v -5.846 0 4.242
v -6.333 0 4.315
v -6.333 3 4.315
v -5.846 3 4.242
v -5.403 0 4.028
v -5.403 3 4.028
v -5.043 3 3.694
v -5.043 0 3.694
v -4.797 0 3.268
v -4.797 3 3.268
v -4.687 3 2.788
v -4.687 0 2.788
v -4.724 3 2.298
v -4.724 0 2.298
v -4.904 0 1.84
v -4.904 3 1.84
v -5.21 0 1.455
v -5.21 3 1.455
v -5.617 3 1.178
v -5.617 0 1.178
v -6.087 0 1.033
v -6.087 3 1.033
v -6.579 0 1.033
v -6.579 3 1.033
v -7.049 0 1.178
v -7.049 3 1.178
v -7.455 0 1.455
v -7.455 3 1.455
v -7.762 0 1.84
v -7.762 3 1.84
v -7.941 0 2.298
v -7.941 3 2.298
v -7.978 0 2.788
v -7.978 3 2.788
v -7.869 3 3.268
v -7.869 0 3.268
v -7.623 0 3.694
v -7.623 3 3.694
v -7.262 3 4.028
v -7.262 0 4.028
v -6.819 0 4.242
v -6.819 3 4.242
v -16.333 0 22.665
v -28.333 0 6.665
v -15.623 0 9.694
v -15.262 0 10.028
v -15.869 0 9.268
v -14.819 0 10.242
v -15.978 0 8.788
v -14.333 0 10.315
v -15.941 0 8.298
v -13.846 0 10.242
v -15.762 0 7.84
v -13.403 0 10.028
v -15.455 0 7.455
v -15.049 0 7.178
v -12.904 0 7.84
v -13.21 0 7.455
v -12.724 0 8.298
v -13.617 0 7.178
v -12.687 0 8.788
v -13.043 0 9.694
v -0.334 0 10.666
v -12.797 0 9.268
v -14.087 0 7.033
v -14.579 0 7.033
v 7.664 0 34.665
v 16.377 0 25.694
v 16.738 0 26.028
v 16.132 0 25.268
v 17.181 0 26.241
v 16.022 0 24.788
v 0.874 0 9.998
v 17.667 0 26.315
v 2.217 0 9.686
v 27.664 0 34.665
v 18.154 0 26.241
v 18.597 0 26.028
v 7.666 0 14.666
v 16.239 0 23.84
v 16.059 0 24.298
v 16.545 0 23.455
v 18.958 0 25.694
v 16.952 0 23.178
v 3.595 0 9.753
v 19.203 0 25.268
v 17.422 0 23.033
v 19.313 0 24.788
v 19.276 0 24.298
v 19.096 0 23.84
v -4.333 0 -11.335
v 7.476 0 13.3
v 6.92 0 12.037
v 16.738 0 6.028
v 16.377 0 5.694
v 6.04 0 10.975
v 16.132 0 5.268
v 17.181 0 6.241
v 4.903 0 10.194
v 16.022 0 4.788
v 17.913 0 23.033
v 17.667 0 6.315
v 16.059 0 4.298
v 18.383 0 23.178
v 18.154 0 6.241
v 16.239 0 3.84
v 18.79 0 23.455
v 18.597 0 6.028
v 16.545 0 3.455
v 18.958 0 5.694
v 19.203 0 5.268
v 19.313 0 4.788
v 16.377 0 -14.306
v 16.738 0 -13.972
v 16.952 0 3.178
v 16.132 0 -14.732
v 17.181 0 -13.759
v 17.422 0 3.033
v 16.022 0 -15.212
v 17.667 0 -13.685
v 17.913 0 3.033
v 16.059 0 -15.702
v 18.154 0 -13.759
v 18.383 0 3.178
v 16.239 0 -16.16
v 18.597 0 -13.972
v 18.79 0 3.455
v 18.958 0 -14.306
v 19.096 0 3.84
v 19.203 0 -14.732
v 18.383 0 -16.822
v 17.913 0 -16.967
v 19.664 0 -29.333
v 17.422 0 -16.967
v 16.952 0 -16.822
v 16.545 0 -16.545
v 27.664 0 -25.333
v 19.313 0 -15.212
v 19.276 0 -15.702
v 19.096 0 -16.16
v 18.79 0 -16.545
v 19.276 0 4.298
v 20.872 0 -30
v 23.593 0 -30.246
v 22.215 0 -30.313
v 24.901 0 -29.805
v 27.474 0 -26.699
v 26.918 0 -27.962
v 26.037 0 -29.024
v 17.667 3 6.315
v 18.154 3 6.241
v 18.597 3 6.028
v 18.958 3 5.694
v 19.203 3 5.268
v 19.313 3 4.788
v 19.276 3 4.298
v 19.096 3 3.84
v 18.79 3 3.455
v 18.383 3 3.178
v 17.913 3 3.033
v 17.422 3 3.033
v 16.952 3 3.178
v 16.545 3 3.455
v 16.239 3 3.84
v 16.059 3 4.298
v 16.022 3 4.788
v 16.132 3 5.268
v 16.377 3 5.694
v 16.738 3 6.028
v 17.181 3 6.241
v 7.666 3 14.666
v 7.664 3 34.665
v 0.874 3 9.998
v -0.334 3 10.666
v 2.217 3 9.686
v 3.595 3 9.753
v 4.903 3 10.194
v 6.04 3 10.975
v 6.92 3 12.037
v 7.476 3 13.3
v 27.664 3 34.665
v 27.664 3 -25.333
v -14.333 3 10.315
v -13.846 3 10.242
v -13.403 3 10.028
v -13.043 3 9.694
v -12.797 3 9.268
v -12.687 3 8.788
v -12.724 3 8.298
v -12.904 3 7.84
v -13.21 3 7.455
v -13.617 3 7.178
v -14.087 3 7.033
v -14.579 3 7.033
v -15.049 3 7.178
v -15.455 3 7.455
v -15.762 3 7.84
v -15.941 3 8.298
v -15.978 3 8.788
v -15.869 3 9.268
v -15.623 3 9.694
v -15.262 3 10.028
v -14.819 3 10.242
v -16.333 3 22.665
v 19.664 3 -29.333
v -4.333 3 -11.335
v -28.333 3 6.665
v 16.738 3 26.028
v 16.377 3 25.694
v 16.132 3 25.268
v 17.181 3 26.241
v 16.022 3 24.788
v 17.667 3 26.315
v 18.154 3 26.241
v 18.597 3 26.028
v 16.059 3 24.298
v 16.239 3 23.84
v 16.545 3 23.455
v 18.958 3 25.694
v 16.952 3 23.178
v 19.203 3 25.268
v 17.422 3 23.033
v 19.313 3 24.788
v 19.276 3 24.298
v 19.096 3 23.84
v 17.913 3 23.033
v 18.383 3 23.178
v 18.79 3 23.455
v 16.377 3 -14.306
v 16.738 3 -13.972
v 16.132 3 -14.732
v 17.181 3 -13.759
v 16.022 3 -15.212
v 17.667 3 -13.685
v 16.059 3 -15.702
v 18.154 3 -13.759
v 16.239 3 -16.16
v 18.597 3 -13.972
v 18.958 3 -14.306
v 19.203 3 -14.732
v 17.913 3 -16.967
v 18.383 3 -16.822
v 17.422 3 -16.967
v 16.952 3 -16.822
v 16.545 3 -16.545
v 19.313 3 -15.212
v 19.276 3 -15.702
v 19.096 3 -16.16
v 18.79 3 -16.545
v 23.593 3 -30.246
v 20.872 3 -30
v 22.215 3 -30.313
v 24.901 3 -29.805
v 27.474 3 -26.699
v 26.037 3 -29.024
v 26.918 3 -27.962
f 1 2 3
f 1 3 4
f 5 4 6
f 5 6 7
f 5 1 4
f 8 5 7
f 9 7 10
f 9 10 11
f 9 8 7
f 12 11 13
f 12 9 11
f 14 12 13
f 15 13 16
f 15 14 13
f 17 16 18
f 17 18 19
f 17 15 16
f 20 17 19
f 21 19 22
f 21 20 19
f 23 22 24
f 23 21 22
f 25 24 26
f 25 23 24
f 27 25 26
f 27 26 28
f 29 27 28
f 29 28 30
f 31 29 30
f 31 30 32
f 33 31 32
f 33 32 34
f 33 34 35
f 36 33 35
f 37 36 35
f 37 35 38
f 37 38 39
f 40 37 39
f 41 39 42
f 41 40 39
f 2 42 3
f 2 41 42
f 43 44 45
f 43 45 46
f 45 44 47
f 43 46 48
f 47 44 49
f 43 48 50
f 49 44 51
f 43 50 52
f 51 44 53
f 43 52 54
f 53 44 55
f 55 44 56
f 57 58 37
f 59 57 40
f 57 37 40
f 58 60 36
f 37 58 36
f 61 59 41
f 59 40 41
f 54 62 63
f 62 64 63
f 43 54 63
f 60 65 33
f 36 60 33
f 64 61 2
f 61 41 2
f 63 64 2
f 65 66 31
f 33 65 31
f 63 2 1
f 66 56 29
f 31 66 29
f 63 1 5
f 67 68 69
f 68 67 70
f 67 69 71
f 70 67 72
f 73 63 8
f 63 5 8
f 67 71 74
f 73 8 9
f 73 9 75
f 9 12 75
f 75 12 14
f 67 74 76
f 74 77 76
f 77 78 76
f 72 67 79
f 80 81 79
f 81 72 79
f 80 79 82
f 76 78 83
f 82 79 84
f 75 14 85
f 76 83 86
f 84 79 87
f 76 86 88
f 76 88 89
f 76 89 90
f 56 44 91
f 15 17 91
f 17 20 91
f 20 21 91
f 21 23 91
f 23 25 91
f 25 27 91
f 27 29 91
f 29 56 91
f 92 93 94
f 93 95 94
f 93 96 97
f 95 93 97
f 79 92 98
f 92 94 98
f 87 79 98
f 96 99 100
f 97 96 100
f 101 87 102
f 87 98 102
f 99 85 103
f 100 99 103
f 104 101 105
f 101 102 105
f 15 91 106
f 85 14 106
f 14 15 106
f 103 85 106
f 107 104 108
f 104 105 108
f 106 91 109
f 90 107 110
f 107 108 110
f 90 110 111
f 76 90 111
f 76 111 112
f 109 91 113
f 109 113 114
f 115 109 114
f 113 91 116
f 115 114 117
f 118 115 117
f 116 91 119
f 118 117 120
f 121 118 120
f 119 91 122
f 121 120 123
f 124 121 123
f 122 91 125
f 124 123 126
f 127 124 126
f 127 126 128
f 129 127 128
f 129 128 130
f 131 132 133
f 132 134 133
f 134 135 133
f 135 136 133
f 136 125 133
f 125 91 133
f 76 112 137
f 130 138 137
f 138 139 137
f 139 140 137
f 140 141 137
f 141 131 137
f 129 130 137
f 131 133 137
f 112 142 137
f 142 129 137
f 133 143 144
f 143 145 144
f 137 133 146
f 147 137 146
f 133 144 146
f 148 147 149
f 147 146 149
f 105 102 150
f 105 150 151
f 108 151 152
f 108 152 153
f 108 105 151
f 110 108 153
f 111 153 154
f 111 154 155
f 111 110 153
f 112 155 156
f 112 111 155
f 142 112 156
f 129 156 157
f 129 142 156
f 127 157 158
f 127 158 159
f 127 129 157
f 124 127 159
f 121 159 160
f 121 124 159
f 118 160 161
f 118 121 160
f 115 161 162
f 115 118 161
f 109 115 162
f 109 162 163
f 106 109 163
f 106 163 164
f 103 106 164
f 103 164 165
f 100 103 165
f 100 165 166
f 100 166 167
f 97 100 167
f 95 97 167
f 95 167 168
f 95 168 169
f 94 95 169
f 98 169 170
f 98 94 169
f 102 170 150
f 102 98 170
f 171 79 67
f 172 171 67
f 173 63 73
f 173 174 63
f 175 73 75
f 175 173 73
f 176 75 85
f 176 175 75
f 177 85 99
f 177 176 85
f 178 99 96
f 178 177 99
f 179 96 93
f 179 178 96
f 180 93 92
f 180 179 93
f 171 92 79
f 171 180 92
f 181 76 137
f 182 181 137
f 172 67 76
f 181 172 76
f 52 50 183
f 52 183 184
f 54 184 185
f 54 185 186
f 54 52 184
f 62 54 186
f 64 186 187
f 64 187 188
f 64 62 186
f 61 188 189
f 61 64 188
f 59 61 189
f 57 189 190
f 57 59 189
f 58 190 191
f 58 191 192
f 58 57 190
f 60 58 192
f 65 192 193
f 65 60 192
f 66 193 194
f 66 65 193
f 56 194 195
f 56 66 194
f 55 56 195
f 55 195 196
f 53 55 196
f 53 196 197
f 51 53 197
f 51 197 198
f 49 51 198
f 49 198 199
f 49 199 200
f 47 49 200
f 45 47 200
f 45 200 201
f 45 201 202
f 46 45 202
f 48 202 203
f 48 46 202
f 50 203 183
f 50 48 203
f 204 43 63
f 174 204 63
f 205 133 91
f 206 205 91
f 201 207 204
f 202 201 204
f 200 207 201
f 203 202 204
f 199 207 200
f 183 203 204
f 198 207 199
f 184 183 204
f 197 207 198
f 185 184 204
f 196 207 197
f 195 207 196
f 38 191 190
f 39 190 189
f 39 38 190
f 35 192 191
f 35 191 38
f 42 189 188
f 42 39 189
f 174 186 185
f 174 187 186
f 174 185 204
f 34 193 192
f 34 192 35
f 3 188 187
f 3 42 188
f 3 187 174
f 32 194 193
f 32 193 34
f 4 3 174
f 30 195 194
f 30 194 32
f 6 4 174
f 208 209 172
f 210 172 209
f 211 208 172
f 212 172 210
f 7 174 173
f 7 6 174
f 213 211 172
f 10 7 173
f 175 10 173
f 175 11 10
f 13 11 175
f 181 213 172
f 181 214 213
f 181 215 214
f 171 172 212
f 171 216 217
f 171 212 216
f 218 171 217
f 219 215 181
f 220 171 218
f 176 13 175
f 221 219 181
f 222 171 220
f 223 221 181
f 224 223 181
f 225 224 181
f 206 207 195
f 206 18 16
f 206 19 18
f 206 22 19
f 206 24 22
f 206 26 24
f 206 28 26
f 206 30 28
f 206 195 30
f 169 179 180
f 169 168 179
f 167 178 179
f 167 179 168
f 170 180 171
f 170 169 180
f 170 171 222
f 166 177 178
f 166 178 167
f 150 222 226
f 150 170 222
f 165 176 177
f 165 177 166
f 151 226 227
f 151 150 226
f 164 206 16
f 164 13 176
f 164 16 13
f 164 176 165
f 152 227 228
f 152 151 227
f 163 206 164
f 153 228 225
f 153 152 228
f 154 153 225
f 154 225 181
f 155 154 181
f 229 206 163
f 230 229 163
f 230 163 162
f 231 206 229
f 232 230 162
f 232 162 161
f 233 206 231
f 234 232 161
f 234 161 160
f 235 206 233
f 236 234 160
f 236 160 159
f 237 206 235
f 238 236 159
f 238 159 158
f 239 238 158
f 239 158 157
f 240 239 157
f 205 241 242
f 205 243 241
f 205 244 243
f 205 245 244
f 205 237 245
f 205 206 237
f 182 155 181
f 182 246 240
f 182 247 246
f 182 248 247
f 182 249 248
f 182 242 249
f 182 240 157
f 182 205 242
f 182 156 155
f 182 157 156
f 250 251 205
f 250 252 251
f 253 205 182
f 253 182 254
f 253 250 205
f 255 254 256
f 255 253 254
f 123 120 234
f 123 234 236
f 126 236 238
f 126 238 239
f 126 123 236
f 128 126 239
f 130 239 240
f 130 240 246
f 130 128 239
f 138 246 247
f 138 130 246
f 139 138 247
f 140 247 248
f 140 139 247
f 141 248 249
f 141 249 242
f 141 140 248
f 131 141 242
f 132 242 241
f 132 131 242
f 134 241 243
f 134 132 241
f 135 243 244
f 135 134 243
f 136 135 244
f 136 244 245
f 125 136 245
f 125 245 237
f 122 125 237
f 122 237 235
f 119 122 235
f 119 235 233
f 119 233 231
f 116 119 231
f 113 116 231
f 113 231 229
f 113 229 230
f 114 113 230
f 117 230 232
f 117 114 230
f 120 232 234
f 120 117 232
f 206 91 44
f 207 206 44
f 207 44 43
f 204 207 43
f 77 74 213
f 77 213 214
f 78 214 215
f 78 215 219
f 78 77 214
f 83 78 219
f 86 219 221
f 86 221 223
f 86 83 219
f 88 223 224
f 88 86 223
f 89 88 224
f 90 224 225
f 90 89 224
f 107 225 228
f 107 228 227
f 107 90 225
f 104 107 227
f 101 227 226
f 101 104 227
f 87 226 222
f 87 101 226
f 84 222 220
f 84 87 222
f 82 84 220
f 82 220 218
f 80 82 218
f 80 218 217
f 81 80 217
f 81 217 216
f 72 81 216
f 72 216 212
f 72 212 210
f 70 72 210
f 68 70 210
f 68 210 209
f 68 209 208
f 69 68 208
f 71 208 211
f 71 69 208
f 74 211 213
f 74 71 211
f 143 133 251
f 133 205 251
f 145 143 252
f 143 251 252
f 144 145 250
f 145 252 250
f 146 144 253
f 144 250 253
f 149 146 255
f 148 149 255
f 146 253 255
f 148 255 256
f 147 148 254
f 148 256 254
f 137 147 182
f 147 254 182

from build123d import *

# Parameters (mm, degrees)
SKETCH_1_R      = 1.649999992
SKETCH_1_R_2    = 1.649999999
SKETCH_1_R_3    = 1.65
EXTRUDE_1_DEPTH = 3
FILLET_2_R      = 5
FILLET_3_R      = 5


with BuildPart() as part:
    # 草图1 → 凸台-拉伸1 (new body)
    with BuildSketch(Plane(origin=(0, 0, 0), x_dir=(1, 0, 0), z_dir=(0, 1, 0))):
        Polygon((-28.332706405, -6.664922467), (-16.332704755, -22.664921194), (7.667293339, -4.664918716), (7.664042293, -34.664767296), (27.664042293, -34.664767296), (27.664489855, 35.332983845), (-4.33270825, 11.335080057), align=None)
        with Locations(Location((17.667491748, 15.335232704, 0), (0, 0, 270))):
            Circle(SKETCH_1_R, mode=Mode.SUBTRACT)
        with Locations(Location((17.667491748, -4.664767296, 0), (0, 0, 270))):
            Circle(SKETCH_1_R, mode=Mode.SUBTRACT)
        with Locations(Location((17.667491748, -24.664767296, 0), (0, 0, 270))):
            Circle(SKETCH_1_R, mode=Mode.SUBTRACT)
        with Locations(Location((-6.332706828, -2.664920166, 0), (0, 0, 270))):
            Circle(SKETCH_1_R_2, mode=Mode.SUBTRACT)
        with Locations(Location((-14.332706205, -8.664920997, 0), (0, 0, 270))):
            Circle(SKETCH_1_R_3, mode=Mode.SUBTRACT)
    extrude(amount=EXTRUDE_1_DEPTH)

    # 圆角2
    fillet_2_edges = [part.edges().sort_by_distance(p)[0] for p in [
        (7.667293339, 1.5, 4.664918716),
    ]]
    fillet(fillet_2_edges, radius=FILLET_2_R)

    # 圆角3
    fillet_3_edges = [part.edges().sort_by_distance(p)[0] for p in [
        (27.664489855, 1.5, -35.332983845),
    ]]
    fillet(fillet_3_edges, radius=FILLET_3_R)


solid = part.part
